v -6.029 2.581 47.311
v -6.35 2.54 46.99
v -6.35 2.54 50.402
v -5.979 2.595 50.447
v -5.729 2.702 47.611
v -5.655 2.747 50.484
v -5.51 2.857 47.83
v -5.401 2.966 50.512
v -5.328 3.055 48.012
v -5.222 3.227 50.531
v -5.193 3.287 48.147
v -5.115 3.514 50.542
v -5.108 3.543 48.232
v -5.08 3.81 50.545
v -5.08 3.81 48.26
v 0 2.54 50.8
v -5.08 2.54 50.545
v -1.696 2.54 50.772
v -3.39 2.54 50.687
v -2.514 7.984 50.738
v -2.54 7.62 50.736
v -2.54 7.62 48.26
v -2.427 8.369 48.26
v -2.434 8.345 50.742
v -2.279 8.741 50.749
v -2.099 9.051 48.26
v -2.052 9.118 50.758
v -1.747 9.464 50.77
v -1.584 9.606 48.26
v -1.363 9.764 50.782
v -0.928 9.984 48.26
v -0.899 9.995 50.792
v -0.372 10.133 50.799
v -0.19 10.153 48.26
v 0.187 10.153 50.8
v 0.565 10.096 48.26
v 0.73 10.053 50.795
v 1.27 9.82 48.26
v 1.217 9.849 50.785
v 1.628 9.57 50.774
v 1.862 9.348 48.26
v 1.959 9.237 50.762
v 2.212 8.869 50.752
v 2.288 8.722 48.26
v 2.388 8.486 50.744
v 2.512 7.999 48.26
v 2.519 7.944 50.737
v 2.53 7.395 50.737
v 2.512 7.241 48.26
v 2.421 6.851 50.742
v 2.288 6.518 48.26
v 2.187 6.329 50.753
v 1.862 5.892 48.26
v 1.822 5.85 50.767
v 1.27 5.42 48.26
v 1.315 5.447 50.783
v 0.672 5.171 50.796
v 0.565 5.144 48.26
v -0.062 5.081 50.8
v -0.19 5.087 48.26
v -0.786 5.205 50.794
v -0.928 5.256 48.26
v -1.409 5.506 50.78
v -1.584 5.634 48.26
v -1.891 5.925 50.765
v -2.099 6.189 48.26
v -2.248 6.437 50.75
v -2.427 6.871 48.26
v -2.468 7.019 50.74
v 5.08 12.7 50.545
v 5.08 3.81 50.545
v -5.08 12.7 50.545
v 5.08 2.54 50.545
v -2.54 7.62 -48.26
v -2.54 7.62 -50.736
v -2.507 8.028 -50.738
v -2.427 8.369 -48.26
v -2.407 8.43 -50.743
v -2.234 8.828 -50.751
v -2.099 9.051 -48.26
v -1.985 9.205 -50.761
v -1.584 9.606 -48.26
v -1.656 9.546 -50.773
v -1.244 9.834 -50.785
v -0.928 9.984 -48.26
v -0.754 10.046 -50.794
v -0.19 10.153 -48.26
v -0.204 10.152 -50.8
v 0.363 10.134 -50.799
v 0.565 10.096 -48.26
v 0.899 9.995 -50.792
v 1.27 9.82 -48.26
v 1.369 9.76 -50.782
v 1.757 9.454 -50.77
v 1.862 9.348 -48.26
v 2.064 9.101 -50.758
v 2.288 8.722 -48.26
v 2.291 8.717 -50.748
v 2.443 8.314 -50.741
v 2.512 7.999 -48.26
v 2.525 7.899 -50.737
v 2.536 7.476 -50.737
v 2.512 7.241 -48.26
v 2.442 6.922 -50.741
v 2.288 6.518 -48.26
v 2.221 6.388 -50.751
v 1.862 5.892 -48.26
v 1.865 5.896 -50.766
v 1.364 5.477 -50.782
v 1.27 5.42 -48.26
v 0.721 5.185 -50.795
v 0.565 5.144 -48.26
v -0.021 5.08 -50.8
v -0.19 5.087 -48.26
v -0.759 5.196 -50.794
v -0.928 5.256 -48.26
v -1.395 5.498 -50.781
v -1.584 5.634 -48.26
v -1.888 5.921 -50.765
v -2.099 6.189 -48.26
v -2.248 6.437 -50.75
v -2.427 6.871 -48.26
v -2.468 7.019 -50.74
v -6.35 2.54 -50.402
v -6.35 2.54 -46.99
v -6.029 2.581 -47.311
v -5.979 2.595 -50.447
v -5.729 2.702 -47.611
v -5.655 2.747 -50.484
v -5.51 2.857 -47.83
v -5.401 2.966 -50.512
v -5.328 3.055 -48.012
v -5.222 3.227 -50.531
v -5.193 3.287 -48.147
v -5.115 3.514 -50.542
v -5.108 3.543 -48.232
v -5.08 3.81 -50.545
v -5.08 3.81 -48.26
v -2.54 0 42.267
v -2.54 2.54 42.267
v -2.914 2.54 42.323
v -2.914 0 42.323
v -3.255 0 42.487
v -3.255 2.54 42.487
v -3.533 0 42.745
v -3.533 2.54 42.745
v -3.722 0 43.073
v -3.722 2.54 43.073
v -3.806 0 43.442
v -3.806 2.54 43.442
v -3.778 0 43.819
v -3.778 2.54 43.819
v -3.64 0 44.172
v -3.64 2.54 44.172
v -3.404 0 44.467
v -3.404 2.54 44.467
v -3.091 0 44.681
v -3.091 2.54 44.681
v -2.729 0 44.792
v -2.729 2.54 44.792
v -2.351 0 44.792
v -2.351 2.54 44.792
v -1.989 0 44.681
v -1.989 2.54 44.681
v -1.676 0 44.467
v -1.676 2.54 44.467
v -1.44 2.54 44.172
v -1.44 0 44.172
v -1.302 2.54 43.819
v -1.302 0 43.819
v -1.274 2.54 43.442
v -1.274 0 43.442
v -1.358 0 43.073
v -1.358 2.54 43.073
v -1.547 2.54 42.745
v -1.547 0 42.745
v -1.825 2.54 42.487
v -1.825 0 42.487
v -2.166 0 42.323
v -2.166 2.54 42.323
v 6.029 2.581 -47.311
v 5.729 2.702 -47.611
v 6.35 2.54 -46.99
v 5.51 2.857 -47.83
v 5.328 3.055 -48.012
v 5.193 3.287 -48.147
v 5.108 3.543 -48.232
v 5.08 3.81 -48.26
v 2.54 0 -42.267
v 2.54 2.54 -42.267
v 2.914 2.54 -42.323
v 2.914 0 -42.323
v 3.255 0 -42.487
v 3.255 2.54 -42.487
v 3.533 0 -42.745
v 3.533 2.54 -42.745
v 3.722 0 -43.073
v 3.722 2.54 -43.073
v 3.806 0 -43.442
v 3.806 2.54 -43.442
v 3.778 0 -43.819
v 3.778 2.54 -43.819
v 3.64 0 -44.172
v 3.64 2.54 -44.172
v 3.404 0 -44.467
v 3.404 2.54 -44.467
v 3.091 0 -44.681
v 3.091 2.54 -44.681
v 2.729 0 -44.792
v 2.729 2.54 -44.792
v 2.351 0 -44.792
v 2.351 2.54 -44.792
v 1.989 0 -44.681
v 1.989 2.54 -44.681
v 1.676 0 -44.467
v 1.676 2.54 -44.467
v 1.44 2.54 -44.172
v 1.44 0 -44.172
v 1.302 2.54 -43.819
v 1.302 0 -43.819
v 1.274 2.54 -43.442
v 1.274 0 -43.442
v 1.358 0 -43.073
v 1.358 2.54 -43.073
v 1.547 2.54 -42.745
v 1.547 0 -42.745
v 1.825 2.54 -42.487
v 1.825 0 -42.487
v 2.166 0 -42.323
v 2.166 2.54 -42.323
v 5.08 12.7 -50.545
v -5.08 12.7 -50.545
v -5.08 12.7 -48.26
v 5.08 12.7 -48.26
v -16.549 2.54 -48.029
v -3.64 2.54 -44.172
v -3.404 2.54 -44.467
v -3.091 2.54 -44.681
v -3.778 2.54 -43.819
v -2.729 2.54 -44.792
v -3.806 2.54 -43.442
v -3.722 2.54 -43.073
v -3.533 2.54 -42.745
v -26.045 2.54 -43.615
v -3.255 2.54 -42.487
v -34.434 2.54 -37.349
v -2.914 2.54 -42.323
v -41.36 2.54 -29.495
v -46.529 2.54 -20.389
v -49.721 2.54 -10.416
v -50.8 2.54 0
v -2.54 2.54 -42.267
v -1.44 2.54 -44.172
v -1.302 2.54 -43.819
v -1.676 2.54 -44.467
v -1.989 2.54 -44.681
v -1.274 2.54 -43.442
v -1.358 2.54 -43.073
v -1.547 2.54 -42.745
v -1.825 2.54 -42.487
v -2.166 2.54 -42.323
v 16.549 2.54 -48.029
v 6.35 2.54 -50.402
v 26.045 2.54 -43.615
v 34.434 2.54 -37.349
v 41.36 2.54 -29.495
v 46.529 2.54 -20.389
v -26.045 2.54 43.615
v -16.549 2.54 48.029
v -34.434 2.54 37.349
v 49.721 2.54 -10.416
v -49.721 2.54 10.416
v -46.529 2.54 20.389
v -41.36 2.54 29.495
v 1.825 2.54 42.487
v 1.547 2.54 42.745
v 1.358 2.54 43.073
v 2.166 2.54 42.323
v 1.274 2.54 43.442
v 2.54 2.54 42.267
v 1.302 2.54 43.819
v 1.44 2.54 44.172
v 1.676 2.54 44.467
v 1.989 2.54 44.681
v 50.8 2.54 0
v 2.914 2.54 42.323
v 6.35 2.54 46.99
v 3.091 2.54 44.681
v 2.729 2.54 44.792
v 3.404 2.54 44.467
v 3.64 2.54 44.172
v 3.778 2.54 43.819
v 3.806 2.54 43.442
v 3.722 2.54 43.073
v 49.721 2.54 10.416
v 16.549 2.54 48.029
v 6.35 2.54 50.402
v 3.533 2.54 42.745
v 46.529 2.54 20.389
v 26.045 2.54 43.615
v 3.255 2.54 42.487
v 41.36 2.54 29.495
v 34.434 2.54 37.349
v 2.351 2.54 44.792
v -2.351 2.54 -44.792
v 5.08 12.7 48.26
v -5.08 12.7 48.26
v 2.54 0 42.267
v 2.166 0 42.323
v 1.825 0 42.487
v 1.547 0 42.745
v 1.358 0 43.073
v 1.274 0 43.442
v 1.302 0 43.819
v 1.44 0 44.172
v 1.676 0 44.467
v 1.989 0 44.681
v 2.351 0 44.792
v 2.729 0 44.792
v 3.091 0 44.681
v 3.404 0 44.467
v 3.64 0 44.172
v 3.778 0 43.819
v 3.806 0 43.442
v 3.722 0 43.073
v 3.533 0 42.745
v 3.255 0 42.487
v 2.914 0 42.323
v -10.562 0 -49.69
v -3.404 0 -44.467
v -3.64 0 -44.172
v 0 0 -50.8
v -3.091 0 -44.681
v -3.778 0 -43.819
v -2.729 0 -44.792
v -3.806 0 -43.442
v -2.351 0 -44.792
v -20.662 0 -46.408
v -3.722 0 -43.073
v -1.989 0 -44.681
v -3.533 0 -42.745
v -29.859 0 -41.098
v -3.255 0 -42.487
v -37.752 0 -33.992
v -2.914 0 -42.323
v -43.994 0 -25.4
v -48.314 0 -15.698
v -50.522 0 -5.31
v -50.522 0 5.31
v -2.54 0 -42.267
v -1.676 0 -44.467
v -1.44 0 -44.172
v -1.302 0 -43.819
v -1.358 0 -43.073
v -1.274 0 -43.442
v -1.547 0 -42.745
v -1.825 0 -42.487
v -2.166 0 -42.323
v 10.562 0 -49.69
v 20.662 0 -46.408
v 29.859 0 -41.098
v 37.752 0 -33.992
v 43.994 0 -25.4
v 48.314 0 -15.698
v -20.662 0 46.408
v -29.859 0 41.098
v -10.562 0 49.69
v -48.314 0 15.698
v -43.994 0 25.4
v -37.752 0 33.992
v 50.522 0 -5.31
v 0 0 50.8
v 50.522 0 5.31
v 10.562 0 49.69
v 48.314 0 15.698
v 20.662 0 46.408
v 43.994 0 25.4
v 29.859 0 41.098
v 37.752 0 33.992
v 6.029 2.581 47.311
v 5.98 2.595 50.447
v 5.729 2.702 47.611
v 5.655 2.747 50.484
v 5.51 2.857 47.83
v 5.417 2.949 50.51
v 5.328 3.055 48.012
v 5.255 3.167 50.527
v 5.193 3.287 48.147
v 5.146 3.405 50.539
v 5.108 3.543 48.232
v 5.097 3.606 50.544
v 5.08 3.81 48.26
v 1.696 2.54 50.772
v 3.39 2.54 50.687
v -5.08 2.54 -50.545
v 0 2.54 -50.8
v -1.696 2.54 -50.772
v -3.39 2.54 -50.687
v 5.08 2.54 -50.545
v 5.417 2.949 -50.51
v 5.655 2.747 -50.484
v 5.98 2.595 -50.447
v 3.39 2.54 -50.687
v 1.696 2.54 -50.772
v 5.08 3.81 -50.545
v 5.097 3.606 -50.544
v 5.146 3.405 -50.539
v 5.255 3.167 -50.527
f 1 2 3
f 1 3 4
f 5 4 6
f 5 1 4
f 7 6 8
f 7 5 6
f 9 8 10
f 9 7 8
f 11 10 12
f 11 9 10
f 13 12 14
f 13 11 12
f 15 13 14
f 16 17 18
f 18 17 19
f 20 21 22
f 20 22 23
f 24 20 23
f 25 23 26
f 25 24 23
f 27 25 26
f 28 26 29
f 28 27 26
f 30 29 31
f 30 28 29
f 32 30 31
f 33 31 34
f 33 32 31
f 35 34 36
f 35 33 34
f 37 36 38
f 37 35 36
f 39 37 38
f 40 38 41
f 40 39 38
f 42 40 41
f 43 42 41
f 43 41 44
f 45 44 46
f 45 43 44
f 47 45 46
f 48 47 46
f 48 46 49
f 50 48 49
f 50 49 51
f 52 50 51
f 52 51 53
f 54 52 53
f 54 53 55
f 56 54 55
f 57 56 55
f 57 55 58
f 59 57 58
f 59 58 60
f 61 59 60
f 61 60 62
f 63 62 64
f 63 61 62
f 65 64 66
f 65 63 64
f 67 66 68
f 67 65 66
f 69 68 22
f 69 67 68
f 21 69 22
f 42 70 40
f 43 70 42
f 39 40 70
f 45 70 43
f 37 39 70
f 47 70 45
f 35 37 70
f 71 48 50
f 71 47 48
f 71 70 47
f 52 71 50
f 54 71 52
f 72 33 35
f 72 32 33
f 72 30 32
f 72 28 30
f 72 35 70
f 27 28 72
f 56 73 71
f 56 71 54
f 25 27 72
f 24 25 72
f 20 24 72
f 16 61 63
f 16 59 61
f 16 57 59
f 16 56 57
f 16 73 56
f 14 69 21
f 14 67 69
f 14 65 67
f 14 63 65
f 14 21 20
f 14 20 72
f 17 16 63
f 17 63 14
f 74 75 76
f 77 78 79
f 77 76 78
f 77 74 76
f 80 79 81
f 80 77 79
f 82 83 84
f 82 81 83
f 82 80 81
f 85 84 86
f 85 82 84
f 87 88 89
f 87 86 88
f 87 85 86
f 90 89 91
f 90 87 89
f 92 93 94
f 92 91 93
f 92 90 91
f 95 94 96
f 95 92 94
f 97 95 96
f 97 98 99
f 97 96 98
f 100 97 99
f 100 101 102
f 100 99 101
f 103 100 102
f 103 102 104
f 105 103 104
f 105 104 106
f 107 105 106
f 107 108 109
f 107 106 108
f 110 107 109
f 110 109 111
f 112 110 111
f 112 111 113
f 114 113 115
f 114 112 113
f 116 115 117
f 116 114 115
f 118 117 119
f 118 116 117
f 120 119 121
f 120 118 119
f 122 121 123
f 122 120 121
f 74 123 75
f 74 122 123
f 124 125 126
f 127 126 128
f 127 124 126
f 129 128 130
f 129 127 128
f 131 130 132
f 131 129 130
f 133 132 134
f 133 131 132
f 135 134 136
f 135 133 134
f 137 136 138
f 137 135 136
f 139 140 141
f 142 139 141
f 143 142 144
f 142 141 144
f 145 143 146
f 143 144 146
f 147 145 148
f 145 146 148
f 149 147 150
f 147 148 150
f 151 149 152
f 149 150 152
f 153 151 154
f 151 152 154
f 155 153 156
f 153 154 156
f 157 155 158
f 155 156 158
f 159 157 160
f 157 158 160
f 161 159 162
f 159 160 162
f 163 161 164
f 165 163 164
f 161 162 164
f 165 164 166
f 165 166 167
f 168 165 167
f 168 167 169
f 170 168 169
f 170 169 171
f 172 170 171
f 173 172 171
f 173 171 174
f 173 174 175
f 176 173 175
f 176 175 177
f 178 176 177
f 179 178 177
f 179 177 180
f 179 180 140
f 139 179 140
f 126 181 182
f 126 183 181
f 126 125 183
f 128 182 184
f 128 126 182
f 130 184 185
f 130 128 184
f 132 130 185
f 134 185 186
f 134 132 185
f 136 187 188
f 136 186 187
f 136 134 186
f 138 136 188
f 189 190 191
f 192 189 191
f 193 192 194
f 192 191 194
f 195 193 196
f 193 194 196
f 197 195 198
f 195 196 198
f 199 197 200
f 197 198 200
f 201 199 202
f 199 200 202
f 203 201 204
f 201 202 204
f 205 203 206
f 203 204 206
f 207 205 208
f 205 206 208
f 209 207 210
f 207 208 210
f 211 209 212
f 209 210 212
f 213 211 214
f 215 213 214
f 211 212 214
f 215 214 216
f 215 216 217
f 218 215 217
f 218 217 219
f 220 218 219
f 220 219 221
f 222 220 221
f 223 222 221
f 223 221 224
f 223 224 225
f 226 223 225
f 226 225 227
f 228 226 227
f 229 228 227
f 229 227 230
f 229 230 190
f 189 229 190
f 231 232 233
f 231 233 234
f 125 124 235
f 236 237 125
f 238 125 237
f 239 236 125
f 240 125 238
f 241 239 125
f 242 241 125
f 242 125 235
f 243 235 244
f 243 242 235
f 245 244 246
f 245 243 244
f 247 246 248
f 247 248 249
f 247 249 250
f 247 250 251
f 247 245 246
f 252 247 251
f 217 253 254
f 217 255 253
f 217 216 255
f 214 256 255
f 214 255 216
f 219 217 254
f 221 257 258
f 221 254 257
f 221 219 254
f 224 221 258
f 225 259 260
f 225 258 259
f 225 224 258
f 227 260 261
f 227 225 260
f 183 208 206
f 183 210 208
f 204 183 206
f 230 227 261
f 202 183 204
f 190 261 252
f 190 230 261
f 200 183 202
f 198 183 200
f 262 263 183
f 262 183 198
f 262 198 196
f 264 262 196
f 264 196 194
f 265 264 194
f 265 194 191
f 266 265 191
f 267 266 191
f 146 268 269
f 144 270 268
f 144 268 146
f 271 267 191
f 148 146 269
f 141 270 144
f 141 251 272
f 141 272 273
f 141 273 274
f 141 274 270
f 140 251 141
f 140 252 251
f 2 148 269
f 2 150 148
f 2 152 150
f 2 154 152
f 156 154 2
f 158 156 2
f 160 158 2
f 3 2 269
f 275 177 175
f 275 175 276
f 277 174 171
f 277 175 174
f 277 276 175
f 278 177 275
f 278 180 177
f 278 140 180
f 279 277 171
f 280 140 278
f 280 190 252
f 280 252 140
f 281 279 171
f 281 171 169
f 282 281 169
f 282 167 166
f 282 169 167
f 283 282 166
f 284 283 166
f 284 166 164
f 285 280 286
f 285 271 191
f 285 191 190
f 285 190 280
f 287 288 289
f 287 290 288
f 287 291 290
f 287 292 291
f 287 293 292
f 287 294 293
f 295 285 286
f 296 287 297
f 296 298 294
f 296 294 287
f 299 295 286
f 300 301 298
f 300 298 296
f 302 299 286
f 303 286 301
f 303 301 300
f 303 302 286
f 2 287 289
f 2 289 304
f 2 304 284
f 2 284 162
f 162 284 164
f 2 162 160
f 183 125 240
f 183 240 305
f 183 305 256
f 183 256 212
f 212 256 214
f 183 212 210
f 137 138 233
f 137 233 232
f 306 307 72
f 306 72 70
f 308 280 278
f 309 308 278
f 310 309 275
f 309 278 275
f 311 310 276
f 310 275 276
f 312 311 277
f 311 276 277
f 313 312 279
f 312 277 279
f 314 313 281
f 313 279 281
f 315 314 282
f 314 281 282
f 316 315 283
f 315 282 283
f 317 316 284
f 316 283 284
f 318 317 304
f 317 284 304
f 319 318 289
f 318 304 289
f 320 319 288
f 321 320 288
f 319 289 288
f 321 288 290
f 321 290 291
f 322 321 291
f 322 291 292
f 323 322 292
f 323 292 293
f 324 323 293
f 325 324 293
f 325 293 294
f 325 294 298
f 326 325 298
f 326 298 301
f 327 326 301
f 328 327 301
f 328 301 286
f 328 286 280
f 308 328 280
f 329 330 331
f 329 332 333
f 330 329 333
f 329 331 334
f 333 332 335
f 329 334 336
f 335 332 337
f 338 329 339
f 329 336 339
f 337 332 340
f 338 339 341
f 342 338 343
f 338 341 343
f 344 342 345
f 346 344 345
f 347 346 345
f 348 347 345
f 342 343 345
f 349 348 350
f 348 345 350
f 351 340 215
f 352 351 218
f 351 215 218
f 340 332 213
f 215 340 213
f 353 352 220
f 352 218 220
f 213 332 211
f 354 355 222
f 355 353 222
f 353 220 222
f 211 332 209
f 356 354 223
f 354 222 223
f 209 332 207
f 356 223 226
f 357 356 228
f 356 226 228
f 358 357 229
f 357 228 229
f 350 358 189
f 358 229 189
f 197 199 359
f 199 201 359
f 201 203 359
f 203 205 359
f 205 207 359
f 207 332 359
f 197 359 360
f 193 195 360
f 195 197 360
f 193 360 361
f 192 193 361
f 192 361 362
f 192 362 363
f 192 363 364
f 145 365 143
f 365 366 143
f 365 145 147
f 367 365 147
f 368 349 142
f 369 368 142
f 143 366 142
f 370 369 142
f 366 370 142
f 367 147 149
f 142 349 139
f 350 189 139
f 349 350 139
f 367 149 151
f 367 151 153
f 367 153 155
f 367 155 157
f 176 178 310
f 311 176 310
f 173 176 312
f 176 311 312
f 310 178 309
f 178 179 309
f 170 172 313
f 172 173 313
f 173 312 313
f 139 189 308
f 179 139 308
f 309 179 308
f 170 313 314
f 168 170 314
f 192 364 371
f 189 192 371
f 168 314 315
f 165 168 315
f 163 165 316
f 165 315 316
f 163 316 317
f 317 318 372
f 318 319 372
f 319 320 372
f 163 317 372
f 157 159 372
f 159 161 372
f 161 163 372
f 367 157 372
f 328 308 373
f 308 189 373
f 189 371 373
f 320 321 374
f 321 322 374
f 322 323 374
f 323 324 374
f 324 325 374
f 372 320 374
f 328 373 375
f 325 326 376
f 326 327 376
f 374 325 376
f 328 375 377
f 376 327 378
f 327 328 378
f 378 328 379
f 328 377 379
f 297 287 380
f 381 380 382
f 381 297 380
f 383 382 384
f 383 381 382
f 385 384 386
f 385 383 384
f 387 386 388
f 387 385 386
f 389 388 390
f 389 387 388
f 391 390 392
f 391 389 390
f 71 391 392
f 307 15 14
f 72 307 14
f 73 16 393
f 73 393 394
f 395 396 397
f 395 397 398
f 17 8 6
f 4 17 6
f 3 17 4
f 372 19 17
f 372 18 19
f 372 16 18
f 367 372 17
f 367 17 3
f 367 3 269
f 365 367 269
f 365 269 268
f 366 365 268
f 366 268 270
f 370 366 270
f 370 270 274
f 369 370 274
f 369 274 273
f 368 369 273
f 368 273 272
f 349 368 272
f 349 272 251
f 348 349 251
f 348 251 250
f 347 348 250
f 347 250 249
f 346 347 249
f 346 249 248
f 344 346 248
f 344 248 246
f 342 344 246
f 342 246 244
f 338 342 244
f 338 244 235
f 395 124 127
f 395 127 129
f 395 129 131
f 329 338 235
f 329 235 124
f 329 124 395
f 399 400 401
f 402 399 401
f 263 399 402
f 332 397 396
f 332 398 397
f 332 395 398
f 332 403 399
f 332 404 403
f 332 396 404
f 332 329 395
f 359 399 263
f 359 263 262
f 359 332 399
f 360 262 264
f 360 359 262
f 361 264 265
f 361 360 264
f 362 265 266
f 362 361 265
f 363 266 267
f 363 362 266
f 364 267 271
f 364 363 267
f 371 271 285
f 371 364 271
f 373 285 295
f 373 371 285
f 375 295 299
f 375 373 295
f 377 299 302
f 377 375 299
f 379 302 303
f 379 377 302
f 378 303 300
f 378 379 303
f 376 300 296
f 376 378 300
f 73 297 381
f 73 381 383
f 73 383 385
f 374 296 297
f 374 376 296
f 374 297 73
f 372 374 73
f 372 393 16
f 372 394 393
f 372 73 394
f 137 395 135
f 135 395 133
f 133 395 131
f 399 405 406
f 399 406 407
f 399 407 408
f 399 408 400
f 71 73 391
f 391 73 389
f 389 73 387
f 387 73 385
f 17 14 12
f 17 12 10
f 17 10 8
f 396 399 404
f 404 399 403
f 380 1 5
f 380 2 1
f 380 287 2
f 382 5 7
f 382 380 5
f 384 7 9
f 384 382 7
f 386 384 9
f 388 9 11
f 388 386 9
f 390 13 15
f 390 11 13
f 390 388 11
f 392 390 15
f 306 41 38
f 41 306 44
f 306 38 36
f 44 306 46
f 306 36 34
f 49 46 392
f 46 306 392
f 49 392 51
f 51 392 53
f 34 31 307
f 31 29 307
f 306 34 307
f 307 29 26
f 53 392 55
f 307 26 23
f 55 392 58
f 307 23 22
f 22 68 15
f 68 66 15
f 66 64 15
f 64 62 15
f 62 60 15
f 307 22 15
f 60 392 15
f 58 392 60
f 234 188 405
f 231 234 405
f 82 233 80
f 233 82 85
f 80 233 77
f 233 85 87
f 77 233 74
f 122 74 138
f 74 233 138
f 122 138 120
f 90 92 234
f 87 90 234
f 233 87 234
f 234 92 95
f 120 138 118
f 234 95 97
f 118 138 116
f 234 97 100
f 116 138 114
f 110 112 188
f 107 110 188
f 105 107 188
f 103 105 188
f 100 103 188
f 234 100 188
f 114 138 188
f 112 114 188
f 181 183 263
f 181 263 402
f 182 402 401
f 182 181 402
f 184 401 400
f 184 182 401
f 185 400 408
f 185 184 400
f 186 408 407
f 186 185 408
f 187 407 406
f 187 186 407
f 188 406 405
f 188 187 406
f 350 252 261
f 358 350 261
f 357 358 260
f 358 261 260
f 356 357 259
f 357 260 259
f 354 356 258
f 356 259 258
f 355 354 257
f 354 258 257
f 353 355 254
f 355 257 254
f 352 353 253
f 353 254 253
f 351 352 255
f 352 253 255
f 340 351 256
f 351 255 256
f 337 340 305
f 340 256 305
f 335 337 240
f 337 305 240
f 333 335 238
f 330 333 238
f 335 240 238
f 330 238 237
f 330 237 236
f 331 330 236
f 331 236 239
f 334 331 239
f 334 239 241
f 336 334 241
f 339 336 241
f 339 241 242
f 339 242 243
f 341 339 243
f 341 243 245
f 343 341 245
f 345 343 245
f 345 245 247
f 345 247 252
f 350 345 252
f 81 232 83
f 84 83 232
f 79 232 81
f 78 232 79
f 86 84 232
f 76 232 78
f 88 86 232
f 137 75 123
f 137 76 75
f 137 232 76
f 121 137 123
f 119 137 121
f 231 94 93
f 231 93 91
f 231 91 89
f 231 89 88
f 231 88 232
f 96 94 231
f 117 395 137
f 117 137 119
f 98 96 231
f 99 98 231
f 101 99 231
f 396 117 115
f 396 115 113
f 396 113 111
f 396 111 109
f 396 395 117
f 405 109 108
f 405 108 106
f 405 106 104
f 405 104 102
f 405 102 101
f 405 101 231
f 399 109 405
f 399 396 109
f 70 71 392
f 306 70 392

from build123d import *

# Parameters (mm, degrees)
SKETCH1_R               = 50.8
BOSS_EXTRUDE1_DEPTH     = 2.54
BOSS_EXTRUDE2_DEPTH     = 10.16
FILLET1_R               = 1.27
CUT_EXTRUDE1_DEPTH      = 113.048264746
CUT_EXTRUDE1_DEPTH_BACK = 113.048264746
SKETCH3_R               = 2.54
SKETCH5_R               = 1.27
CUT_EXTRUDE2_DEPTH      = 73.556912988


# Read off the part's stored shape, not the designer's step: Boss-Extrude2
with BuildPart() as part:
    # Sketch1 → Boss-Extrude1 (new body)
    with BuildSketch(Plane(origin=(0, 0, 0), x_dir=(1, 0, 0), z_dir=(0, 1, 0))):
        with Locations(Location((0, 0, 0), (0, 0, 270))):
            Circle(SKETCH1_R)
    extrude(amount=BOSS_EXTRUDE1_DEPTH)


with BuildPart() as boss_extrude2_tool:
    # Boss-Extrude2 outline → Boss-Extrude2 (new body)
    with BuildSketch(Plane(origin=(0, 2.54, 0), x_dir=(1, 0, 0), z_dir=(0, 1, 0))):
        with BuildLine():
            Line((-5.08, -48.26), (-5.08, -50.545361805))
            add(Edge.make_bspline(
                [(5.08, -50.545361805), (0, -51.054638195), (-5.08, -50.545361805)],
                knots=[0, 0, 0, 1, 1, 1], degree=2))
            Line((5.08, -50.545361805), (5.08, -48.26))
            Line((5.08, -48.26), (-5.08, -48.26))
        make_face()
        with BuildLine():
            Line((5.08, 48.26), (5.08, 50.545361805))
            add(Edge.make_bspline(
                [(-5.08, 50.545361805), (0, 51.054638195), (5.08, 50.545361805)],
                knots=[0, 0, 0, 1, 1, 1], degree=2))
            Line((-5.08, 50.545361805), (-5.08, 48.26))
            Line((-5.08, 48.26), (5.08, 48.26))
        make_face()
    extrude(amount=BOSS_EXTRUDE2_DEPTH)


with BuildPart() as part_1:
    add(part.part)


with BuildPart() as part_2:
    # Boss-Extrude2: joined with boss_extrude2_tool
    add(part_1.part.fuse(boss_extrude2_tool.part, tol=0.00001))

    # Fillet1
    # the kernel refuses this fillet: 1.27 mm, written as the material it adds along each edge
    with BuildSketch(Plane(origin=(-5.08, 2.54, -48.26), x_dir=(0, 0, 1), z_dir=(1, 0, 0)), Plane(origin=(5.08, 2.54, 48.26), x_dir=(0, 0, -1), z_dir=(-1, 0, 0))) as fillet1_piece_1:
        with BuildLine():
            CenterArc((FILLET1_R, -FILLET1_R), FILLET1_R, 90, 90)
            Line((0, -FILLET1_R), (0, 0))
            Line((0, 0), (FILLET1_R, 0))
        make_face()
    extrude(amount=10.16)
    with BuildSketch(Plane(origin=(5.08, 2.54, -48.26), x_dir=(1, 0, 0), z_dir=(0, 0, -1))) as fillet1_piece_2_section:
        with BuildLine():
            CenterArc((FILLET1_R, -FILLET1_R), FILLET1_R, 90, 90)
            Line((0, -FILLET1_R), (0, 0))
            Line((0, 0), (FILLET1_R, 0))
        make_face()
    fillet1_piece_2 = extrude(amount=5.460361805, mode=Mode.PRIVATE)
    fillet1_piece_2 = fillet1_piece_2 & Plane(origin=(0, 2.829642474, 0), x_dir=(0, 0, 1), z_dir=(0, -1, 0)) * Cylinder(50.8, 17, mode=Mode.PRIVATE)
    add(fillet1_piece_2)
    with BuildSketch(Plane(origin=(5.08, 2.54, 53.720361805), x_dir=(1, 0, 0), z_dir=(0, 0, -1))) as fillet1_piece_3_section:
        with BuildLine():
            CenterArc((FILLET1_R, -FILLET1_R), FILLET1_R, 90, 90)
            Line((0, -FILLET1_R), (0, 0))
            Line((0, 0), (FILLET1_R, 0))
        make_face()
    fillet1_piece_3 = extrude(amount=5.460361805, mode=Mode.PRIVATE)
    fillet1_piece_3 = fillet1_piece_3 & Plane(origin=(0, 2.829642639, 0), x_dir=(0, 0, 1), z_dir=(0, -1, 0)) * Cylinder(50.8, 17, mode=Mode.PRIVATE)
    add(fillet1_piece_3)
    with BuildSketch(Plane(origin=(-5.08, 2.54, 48.26), x_dir=(-1, 0, 0), z_dir=(0, 0, 1))) as fillet1_piece_4_section:
        with BuildLine():
            CenterArc((FILLET1_R, -FILLET1_R), FILLET1_R, 90, 90)
            Line((0, -FILLET1_R), (0, 0))
            Line((0, 0), (FILLET1_R, 0))
        make_face()
    fillet1_piece_4 = extrude(amount=5.460361805, mode=Mode.PRIVATE)
    fillet1_piece_4 = fillet1_piece_4 & Plane(origin=(0, 2.829642474, 0), x_dir=(0, 0, 1), z_dir=(0, -1, 0)) * Cylinder(50.8, 17, mode=Mode.PRIVATE)
    add(fillet1_piece_4)
    with BuildSketch(Plane(origin=(-5.08, 2.54, -53.720361805), x_dir=(-1, 0, 0), z_dir=(0, 0, 1))) as fillet1_piece_5_section:
        with BuildLine():
            CenterArc((FILLET1_R, -FILLET1_R), FILLET1_R, 90, 90)
            Line((0, -FILLET1_R), (0, 0))
            Line((0, 0), (FILLET1_R, 0))
        make_face()
    fillet1_piece_5 = extrude(amount=5.460361805, mode=Mode.PRIVATE)
    fillet1_piece_5 = fillet1_piece_5 & Plane(origin=(0, 2.829642639, 0), x_dir=(0, 0, 1), z_dir=(0, -1, 0)) * Cylinder(50.8, 17, mode=Mode.PRIVATE)
    add(fillet1_piece_5)
    with BuildSketch(Plane(origin=(-5.08, 2.54, -53.720361805), x_dir=(-1, 0, 0), z_dir=(0, 0, 1))) as fillet1_piece_6a_section:
        with BuildLine():
            CenterArc((FILLET1_R, -FILLET1_R), FILLET1_R, 90, 90)
            Line((0, -FILLET1_R), (0, 0))
            Line((0, 0), (FILLET1_R, 0))
        make_face()
    fillet1_piece_6a = extrude(amount=8.635361805, mode=Mode.PRIVATE)
    fillet1_piece_6a = split(fillet1_piece_6a, bisect_by=Plane(origin=(-5.367521795, 2.827521795, -48.26), z_dir=(0, 0, 1)), keep=Keep.TOP, mode=Mode.PRIVATE)
    with BuildSketch(Plane(origin=(-8.255, 2.54, -48.26), x_dir=(0, 0, 1), z_dir=(1, 0, 0))) as fillet1_piece_6b_section:
        with BuildLine():
            CenterArc((FILLET1_R, -FILLET1_R), FILLET1_R, 90, 90)
            Line((0, -FILLET1_R), (0, 0))
            Line((0, 0), (FILLET1_R, 0))
        make_face()
    fillet1_piece_6b = extrude(amount=13.335, mode=Mode.PRIVATE)
    fillet1_piece_6b = split(fillet1_piece_6b, bisect_by=Plane(origin=(-5.08, 2.827521795, -47.972478205), z_dir=(-1, 0, 0)), keep=Keep.TOP, mode=Mode.PRIVATE)
    fillet1_piece_6 = fillet1_piece_6a & fillet1_piece_6b
    add(fillet1_piece_6)
    with BuildSketch(Plane(origin=(-5.08, 2.54, -48.26), x_dir=(0, 0, 1), z_dir=(1, 0, 0))) as fillet1_piece_7a_section:
        with BuildLine():
            CenterArc((FILLET1_R, -FILLET1_R), FILLET1_R, 90, 90)
            Line((0, -FILLET1_R), (0, 0))
            Line((0, 0), (FILLET1_R, 0))
        make_face()
    fillet1_piece_7a = extrude(amount=13.335, mode=Mode.PRIVATE)
    fillet1_piece_7a = split(fillet1_piece_7a, bisect_by=Plane(origin=(5.08, 2.827521795, -47.972478205), z_dir=(1, 0, 0)), keep=Keep.TOP, mode=Mode.PRIVATE)
    with BuildSketch(Plane(origin=(5.08, 2.54, -45.085), x_dir=(1, 0, 0), z_dir=(0, 0, -1))) as fillet1_piece_7b_section:
        with BuildLine():
            CenterArc((FILLET1_R, -FILLET1_R), FILLET1_R, 90, 90)
            Line((0, -FILLET1_R), (0, 0))
            Line((0, 0), (FILLET1_R, 0))
        make_face()
    fillet1_piece_7b = extrude(amount=8.635361805, mode=Mode.PRIVATE)
    fillet1_piece_7b = split(fillet1_piece_7b, bisect_by=Plane(origin=(5.367521795, 2.827521795, -48.26), z_dir=(0, 0, 1)), keep=Keep.TOP, mode=Mode.PRIVATE)
    fillet1_piece_7 = fillet1_piece_7a & fillet1_piece_7b
    add(fillet1_piece_7)
    with BuildSketch(Plane(origin=(5.08, 2.54, 53.720361805), x_dir=(1, 0, 0), z_dir=(0, 0, -1))) as fillet1_piece_8a_section:
        with BuildLine():
            CenterArc((FILLET1_R, -FILLET1_R), FILLET1_R, 90, 90)
            Line((0, -FILLET1_R), (0, 0))
            Line((0, 0), (FILLET1_R, 0))
        make_face()
    fillet1_piece_8a = extrude(amount=8.635361805, mode=Mode.PRIVATE)
    fillet1_piece_8a = split(fillet1_piece_8a, bisect_by=Plane(origin=(5.367521795, 2.827521795, 48.26), z_dir=(0, 0, -1)), keep=Keep.TOP, mode=Mode.PRIVATE)
    with BuildSketch(Plane(origin=(8.255, 2.54, 48.26), x_dir=(0, 0, -1), z_dir=(-1, 0, 0))) as fillet1_piece_8b_section:
        with BuildLine():
            CenterArc((FILLET1_R, -FILLET1_R), FILLET1_R, 90, 90)
            Line((0, -FILLET1_R), (0, 0))
            Line((0, 0), (FILLET1_R, 0))
        make_face()
    fillet1_piece_8b = extrude(amount=13.335, mode=Mode.PRIVATE)
    fillet1_piece_8b = split(fillet1_piece_8b, bisect_by=Plane(origin=(5.08, 2.827521795, 47.972478205), z_dir=(1, 0, 0)), keep=Keep.TOP, mode=Mode.PRIVATE)
    fillet1_piece_8 = fillet1_piece_8a & fillet1_piece_8b
    add(fillet1_piece_8)
    with BuildSketch(Plane(origin=(5.08, 2.54, 48.26), x_dir=(0, 0, -1), z_dir=(-1, 0, 0))) as fillet1_piece_9a_section:
        with BuildLine():
            CenterArc((FILLET1_R, -FILLET1_R), FILLET1_R, 90, 90)
            Line((0, -FILLET1_R), (0, 0))
            Line((0, 0), (FILLET1_R, 0))
        make_face()
    fillet1_piece_9a = extrude(amount=13.335, mode=Mode.PRIVATE)
    fillet1_piece_9a = split(fillet1_piece_9a, bisect_by=Plane(origin=(-5.08, 2.827521795, 47.972478205), z_dir=(-1, 0, 0)), keep=Keep.TOP, mode=Mode.PRIVATE)
    with BuildSketch(Plane(origin=(-5.08, 2.54, 45.085), x_dir=(-1, 0, 0), z_dir=(0, 0, 1))) as fillet1_piece_9b_section:
        with BuildLine():
            CenterArc((FILLET1_R, -FILLET1_R), FILLET1_R, 90, 90)
            Line((0, -FILLET1_R), (0, 0))
            Line((0, 0), (FILLET1_R, 0))
        make_face()
    fillet1_piece_9b = extrude(amount=8.635361805, mode=Mode.PRIVATE)
    fillet1_piece_9b = split(fillet1_piece_9b, bisect_by=Plane(origin=(-5.367521795, 2.827521795, 48.26), z_dir=(0, 0, -1)), keep=Keep.TOP, mode=Mode.PRIVATE)
    fillet1_piece_9 = fillet1_piece_9a & fillet1_piece_9b
    add(fillet1_piece_9)

    # Sketch3 → Cut-Extrude1 (cut, two sides: drawn at the far end of the back side and taken through both)
    with BuildSketch(Plane(origin=(0, 0, 48.26), x_dir=(-1, 0, 0), z_dir=(0, 0, -1)).offset(-CUT_EXTRUDE1_DEPTH_BACK)):
        with Locations((0, 7.62)):
            Circle(SKETCH3_R)
    extrude(amount=CUT_EXTRUDE1_DEPTH + CUT_EXTRUDE1_DEPTH_BACK, mode=Mode.SUBTRACT)

    # Sketch5 → Cut-Extrude2 (cut, through all)
    with BuildSketch(Plane(origin=(0, 2.54, 0), x_dir=(1, 0, 0), z_dir=(0, 1, 0))):
        with Locations(Location((-2.54, 43.536503653, 0), (0, 0, 270))):
            Circle(SKETCH5_R)
        with Locations(Location((2.54, 43.536503653, 0), (0, 0, 270))):
            Circle(SKETCH5_R)
        with Locations(Location((2.54, -43.536503653, 0), (0, 0, 90))):
            Circle(SKETCH5_R)
        with Locations(Location((-2.54, -43.536503653, 0), (0, 0, 90))):
            Circle(SKETCH5_R)
    extrude(amount=-CUT_EXTRUDE2_DEPTH, mode=Mode.SUBTRACT)


solid = part_2.part
